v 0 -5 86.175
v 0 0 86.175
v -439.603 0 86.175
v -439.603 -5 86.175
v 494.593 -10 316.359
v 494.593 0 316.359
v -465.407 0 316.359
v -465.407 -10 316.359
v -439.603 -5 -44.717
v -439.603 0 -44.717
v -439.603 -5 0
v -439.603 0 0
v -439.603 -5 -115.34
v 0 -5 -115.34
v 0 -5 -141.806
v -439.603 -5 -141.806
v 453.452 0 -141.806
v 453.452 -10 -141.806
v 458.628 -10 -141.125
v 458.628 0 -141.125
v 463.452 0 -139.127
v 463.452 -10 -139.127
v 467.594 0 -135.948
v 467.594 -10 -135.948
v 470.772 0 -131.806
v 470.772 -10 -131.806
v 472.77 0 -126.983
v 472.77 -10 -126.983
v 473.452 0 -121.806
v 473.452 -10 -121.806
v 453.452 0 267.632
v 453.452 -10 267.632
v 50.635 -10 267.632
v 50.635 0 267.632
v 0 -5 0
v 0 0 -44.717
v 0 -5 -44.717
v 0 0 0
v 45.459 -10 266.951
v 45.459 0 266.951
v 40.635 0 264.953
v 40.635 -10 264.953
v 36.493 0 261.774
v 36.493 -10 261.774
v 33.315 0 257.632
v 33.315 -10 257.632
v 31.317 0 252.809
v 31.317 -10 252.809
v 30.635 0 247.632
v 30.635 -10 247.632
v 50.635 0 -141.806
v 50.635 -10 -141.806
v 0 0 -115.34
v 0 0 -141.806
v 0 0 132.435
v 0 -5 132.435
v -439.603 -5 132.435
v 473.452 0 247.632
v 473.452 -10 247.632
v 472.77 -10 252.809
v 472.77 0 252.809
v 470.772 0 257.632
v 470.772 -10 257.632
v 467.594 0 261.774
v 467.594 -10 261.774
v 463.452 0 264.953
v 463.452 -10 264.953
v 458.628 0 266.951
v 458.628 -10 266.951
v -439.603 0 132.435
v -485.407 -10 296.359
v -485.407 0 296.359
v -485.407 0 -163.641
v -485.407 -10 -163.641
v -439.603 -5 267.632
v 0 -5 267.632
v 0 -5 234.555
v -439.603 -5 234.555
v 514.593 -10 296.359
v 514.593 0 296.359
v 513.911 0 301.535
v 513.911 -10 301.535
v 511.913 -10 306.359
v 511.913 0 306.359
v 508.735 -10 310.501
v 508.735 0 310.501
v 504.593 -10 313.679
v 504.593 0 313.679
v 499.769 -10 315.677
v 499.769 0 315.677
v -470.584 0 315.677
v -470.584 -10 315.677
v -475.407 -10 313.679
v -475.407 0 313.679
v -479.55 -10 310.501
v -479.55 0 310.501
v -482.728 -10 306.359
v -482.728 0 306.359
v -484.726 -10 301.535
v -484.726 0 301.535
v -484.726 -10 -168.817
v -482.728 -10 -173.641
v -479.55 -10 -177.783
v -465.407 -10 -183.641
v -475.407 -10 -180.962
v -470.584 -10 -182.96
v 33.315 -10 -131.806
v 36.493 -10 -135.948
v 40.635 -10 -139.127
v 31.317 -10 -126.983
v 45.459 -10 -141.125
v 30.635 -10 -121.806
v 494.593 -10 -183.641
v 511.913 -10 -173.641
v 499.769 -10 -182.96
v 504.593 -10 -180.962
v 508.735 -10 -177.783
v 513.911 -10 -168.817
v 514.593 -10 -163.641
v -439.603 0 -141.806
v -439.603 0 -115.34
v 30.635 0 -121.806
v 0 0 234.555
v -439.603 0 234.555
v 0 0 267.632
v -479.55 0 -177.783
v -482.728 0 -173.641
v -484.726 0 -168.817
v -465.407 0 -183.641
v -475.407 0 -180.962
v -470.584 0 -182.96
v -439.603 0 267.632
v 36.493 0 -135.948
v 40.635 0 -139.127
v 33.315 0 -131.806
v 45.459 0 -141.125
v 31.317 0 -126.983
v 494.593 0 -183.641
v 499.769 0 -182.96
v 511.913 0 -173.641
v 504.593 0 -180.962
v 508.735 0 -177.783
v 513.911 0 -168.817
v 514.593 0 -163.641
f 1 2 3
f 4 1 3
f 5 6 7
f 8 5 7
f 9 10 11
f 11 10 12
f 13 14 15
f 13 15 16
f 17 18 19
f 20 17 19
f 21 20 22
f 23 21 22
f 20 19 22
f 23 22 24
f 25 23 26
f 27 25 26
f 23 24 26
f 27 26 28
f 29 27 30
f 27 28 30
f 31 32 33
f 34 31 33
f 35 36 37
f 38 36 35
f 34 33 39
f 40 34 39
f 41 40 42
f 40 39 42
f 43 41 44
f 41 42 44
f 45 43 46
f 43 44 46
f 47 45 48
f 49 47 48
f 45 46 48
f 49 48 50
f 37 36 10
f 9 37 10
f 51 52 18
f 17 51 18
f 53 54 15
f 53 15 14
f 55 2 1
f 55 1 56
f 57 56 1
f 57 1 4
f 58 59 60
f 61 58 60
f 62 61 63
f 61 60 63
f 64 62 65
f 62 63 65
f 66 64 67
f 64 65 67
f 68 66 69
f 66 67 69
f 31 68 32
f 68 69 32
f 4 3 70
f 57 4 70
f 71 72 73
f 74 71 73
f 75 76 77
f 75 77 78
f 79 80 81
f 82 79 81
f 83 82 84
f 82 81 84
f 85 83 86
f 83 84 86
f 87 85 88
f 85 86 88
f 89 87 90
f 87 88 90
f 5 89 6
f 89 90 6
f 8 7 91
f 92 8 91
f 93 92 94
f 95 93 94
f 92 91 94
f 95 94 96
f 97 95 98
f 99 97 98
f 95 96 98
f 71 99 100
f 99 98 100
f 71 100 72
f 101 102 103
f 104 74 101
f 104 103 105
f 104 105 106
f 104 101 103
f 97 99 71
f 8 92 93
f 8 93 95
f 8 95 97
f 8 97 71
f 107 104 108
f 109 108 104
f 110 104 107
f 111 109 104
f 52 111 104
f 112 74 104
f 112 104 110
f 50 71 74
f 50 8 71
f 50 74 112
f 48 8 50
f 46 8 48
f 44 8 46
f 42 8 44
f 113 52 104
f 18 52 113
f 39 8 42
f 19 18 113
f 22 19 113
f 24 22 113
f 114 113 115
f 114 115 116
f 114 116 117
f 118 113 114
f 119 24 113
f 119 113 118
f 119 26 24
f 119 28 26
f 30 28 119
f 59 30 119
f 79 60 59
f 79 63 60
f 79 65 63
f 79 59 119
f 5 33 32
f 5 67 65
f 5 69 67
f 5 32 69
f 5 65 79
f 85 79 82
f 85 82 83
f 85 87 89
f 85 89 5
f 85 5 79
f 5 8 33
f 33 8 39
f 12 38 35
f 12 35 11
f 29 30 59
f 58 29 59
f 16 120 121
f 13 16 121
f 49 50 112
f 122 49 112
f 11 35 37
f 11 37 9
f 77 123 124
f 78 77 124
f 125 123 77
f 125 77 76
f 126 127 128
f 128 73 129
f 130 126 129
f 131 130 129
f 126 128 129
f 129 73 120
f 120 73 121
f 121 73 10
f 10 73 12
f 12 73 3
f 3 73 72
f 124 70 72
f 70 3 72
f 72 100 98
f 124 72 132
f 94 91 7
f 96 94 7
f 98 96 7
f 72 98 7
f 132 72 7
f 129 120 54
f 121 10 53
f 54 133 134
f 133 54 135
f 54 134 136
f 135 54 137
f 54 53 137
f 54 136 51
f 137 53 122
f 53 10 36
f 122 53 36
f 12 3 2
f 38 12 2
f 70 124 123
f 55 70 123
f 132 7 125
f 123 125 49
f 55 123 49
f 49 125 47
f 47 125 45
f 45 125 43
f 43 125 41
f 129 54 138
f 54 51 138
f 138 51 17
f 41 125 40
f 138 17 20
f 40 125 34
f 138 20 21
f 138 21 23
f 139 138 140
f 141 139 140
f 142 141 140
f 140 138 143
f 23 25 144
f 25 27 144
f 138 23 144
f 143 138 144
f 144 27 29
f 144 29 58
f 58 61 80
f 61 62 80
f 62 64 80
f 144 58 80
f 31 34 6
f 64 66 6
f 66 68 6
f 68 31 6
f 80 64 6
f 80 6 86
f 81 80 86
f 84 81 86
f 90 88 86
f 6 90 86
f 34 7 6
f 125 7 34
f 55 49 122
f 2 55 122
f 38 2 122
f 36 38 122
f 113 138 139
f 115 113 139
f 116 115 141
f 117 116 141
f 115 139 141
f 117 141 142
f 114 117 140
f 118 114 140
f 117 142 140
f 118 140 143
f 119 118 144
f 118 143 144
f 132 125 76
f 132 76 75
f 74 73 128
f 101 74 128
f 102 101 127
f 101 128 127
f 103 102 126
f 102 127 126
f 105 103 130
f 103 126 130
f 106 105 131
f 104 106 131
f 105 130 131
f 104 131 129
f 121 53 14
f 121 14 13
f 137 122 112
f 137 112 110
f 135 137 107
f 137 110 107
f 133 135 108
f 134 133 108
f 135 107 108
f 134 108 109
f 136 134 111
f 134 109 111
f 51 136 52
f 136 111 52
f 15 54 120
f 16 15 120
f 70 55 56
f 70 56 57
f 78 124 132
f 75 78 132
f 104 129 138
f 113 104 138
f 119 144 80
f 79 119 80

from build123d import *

# Parameters (mm, degrees)
F1_DEPTH = 10
F3_DEPTH = 25
F4_W     = 439.603239
F4_H     = 26.46663
F4_H_2   = 44.717323
F4_H_3   = 46.259694
F4_H_4   = 33.076853
F5_DEPTH = 5


with BuildPart() as f1:
    # F0 (on Front) → F1 (new body)
    with BuildSketch(Plane.XZ):
        with BuildLine():
            Line((494.592618, 316.358934), (-465.407382, 316.358934))
            ThreePointArc((-465.407382, 316.358934), (-479.549518, 310.501069), (-485.407382, 296.358934))
            Line((-485.407382, 296.358934), (-485.407382, -163.641066))
            ThreePointArc((-485.407382, -163.641066), (-479.549518, -177.783202), (-465.407382, -183.641066))
            Line((-465.407382, -183.641066), (494.592618, -183.641066))
            ThreePointArc((494.592618, -183.641066), (508.734753, -177.783202), (514.592618, -163.641066))
            Line((514.592618, -163.641066), (514.592618, 296.358934))
            ThreePointArc((514.592618, 296.358934), (508.734753, 310.501069), (494.592618, 316.358934))
        make_face()
    extrude(amount=F1_DEPTH)

    # F2 (on face) → F3 (cut)
    with BuildSketch(Plane.XZ.offset(10)):
        with BuildLine():
            Line((453.451734, 267.632127), (50.635236, 267.632127))
            ThreePointArc((50.635236, 267.632127), (36.4931, 261.774262), (30.635236, 247.632127))
            Line((30.635236, 247.632127), (30.635236, -121.80623))
            ThreePointArc((30.635236, -121.80623), (36.4931, -135.948366), (50.635236, -141.80623))
            Line((50.635236, -141.80623), (453.451734, -141.80623))
            ThreePointArc((453.451734, -141.80623), (467.593869, -135.948366), (473.451734, -121.80623))
            Line((473.451734, -121.80623), (473.451734, 247.632127))
            ThreePointArc((473.451734, 247.632127), (467.593869, 261.774262), (453.451734, 267.632127))
        make_face()
    extrude(amount=-F3_DEPTH, mode=Mode.SUBTRACT)

    # F4 (on face) → F5 (cut)
    with BuildSketch(Plane(origin=(0, 0, 0), x_dir=(-1, 0, 0), z_dir=(0, 1, 0))):
        with Locations((219.801619, -128.572915)):
            Rectangle(F4_W, F4_H)
        with Locations((219.801619, -22.358662)):
            Rectangle(F4_W, F4_H_2)
        with Locations((219.801619, 109.305013)):
            Rectangle(F4_W, F4_H_3)
        with Locations((219.801619, 251.0937)):
            Rectangle(F4_W, F4_H_4)
    extrude(amount=-F5_DEPTH, mode=Mode.SUBTRACT)


solid = f1.part
